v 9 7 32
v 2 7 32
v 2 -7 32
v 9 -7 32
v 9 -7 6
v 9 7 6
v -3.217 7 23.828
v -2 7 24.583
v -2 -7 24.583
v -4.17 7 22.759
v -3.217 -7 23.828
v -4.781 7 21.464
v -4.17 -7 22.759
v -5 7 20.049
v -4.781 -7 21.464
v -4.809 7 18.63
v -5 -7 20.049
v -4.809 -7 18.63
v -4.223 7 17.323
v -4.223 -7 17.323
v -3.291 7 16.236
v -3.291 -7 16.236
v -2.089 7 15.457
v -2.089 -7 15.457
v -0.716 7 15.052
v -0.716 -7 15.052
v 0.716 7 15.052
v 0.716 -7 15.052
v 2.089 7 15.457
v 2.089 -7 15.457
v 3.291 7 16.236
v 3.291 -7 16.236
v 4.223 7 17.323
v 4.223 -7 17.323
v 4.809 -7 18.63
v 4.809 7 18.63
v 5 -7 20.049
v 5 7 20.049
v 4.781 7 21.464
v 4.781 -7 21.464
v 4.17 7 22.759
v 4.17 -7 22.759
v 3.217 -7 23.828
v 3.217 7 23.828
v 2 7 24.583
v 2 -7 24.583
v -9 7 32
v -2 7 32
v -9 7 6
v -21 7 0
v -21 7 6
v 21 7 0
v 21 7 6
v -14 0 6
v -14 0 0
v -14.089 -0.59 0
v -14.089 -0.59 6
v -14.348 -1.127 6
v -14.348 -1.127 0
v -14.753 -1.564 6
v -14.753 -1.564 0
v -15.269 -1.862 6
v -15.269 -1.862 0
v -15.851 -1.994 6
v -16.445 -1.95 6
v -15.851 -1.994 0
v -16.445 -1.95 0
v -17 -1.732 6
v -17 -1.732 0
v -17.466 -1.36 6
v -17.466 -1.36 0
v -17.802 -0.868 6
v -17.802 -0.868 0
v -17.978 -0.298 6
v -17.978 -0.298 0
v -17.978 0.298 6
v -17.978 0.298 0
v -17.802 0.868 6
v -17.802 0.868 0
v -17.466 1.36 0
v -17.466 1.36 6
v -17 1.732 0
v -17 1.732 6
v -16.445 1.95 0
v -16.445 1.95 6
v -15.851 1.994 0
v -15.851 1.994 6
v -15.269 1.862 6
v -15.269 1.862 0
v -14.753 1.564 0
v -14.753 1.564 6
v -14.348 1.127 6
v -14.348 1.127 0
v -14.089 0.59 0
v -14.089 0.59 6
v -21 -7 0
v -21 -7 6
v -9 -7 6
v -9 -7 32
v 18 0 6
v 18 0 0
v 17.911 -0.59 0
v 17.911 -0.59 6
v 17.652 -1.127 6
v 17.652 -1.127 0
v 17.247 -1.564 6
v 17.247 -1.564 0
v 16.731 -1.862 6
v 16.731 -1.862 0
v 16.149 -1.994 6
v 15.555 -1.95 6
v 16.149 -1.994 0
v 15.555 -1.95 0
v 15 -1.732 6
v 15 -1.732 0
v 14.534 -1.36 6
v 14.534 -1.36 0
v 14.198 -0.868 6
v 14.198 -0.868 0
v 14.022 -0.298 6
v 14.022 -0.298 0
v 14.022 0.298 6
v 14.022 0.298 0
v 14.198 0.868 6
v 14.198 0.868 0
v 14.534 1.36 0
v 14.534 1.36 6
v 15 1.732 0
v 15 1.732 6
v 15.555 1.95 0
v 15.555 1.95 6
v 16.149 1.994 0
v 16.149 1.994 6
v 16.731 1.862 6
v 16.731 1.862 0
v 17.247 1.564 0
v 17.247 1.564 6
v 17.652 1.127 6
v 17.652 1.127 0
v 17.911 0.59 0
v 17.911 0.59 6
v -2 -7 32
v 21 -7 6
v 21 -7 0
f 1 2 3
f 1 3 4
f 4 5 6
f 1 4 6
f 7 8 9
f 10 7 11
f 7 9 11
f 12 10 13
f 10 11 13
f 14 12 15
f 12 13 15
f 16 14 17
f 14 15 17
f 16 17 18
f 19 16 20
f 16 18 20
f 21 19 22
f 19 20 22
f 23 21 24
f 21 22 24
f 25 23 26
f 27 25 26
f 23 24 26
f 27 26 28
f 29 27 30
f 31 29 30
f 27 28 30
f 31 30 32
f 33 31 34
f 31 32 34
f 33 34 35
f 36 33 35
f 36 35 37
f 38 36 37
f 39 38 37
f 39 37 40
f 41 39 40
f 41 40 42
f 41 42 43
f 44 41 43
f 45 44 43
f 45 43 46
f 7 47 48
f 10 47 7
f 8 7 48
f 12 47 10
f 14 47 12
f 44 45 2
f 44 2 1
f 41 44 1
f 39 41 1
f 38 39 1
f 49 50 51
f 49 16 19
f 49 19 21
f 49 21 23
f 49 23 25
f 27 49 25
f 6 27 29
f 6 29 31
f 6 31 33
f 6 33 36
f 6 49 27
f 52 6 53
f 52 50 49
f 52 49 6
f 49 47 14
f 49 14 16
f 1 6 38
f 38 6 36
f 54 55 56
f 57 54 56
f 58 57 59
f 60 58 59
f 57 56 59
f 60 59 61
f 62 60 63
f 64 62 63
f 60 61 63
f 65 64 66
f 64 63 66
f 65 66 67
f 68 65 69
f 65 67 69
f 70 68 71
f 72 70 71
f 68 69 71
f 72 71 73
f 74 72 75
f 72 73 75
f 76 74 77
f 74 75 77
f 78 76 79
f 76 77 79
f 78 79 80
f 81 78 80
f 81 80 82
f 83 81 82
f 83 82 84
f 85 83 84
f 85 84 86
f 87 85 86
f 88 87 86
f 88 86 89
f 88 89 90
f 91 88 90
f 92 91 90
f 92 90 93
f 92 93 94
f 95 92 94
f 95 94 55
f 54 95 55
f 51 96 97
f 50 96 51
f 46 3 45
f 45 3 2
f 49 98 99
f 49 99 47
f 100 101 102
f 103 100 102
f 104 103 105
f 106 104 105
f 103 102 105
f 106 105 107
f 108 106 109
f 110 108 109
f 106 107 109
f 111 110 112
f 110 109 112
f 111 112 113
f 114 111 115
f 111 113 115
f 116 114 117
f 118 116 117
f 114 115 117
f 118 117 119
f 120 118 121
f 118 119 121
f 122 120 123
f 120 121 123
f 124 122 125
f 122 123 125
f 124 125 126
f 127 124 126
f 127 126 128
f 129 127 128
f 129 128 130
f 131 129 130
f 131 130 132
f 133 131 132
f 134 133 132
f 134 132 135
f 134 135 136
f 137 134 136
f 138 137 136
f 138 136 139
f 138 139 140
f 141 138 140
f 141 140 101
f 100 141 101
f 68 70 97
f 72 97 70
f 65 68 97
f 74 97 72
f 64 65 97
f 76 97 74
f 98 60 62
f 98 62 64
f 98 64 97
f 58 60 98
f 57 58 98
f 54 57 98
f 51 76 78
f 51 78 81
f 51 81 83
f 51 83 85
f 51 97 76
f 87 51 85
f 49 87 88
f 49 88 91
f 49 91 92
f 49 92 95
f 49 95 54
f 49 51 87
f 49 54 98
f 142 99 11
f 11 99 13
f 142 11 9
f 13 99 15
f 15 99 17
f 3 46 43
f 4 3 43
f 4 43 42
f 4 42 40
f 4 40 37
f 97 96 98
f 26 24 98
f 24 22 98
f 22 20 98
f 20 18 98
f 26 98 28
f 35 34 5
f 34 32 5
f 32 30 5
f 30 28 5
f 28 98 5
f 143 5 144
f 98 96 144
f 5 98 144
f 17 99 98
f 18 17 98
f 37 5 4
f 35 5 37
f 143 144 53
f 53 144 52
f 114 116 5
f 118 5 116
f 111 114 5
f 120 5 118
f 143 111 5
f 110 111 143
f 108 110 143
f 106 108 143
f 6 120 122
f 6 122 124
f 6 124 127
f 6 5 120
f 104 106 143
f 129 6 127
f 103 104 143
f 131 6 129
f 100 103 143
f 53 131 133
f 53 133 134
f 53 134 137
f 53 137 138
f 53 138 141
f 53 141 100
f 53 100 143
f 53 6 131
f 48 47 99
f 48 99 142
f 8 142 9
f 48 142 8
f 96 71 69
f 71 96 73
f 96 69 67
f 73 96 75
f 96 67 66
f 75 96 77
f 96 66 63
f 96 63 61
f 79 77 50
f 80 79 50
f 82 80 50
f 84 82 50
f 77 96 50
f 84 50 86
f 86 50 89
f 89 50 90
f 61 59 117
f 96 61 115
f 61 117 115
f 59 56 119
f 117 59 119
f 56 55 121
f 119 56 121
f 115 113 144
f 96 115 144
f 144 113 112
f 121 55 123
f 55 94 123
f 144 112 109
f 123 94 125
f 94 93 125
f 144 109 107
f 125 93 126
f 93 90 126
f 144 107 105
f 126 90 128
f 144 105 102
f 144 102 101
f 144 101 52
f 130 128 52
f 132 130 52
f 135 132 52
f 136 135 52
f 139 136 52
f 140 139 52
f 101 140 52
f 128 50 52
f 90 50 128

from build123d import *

# Parameters (mm, degrees)
F0_W      = 42
F0_H      = 14
F1_DEPTH  = 6
F2_W      = 18
F2_H      = 14
F3_DEPTH  = 26
F4_R      = 5
F5_DEPTH  = 14
F7_W      = 4
F7_H      = 14
F8_DEPTH  = 14
F10_R     = 2
F11_DEPTH = 25


with BuildPart() as f1:
    # F0 (on Top) → F1 (new body)
    with BuildSketch(Plane.XY):
        Rectangle(F0_W, F0_H)
    extrude(amount=F1_DEPTH)

    # F2 (on face) → F3 (join)
    with BuildSketch(Plane.XY.offset(6)):
        Rectangle(F2_W, F2_H)
    extrude(amount=F3_DEPTH)

    # F4 (on face) → F5 (cut, through all)
    with BuildSketch(Plane.XZ.offset(7)):
        with Locations((0, 20)):
            Circle(F4_R)
    extrude(amount=-F5_DEPTH, mode=Mode.SUBTRACT)

    # F7 (on face) → F8 (cut)
    with BuildSketch(Plane.XY.offset(32)):
        Rectangle(F7_W, F7_H)
    extrude(amount=-F8_DEPTH, mode=Mode.SUBTRACT)

    # F10 (on face) → F11 (cut)
    with BuildSketch(Plane(origin=(0, 0, 0), x_dir=(1, 0, 0), z_dir=(0, 0, -1))):
        with Locations((16, 0)):
            Circle(F10_R)
        with Locations((-16, 0)):
            Circle(F10_R)
    extrude(amount=-F11_DEPTH, mode=Mode.SUBTRACT)


solid = f1.part
